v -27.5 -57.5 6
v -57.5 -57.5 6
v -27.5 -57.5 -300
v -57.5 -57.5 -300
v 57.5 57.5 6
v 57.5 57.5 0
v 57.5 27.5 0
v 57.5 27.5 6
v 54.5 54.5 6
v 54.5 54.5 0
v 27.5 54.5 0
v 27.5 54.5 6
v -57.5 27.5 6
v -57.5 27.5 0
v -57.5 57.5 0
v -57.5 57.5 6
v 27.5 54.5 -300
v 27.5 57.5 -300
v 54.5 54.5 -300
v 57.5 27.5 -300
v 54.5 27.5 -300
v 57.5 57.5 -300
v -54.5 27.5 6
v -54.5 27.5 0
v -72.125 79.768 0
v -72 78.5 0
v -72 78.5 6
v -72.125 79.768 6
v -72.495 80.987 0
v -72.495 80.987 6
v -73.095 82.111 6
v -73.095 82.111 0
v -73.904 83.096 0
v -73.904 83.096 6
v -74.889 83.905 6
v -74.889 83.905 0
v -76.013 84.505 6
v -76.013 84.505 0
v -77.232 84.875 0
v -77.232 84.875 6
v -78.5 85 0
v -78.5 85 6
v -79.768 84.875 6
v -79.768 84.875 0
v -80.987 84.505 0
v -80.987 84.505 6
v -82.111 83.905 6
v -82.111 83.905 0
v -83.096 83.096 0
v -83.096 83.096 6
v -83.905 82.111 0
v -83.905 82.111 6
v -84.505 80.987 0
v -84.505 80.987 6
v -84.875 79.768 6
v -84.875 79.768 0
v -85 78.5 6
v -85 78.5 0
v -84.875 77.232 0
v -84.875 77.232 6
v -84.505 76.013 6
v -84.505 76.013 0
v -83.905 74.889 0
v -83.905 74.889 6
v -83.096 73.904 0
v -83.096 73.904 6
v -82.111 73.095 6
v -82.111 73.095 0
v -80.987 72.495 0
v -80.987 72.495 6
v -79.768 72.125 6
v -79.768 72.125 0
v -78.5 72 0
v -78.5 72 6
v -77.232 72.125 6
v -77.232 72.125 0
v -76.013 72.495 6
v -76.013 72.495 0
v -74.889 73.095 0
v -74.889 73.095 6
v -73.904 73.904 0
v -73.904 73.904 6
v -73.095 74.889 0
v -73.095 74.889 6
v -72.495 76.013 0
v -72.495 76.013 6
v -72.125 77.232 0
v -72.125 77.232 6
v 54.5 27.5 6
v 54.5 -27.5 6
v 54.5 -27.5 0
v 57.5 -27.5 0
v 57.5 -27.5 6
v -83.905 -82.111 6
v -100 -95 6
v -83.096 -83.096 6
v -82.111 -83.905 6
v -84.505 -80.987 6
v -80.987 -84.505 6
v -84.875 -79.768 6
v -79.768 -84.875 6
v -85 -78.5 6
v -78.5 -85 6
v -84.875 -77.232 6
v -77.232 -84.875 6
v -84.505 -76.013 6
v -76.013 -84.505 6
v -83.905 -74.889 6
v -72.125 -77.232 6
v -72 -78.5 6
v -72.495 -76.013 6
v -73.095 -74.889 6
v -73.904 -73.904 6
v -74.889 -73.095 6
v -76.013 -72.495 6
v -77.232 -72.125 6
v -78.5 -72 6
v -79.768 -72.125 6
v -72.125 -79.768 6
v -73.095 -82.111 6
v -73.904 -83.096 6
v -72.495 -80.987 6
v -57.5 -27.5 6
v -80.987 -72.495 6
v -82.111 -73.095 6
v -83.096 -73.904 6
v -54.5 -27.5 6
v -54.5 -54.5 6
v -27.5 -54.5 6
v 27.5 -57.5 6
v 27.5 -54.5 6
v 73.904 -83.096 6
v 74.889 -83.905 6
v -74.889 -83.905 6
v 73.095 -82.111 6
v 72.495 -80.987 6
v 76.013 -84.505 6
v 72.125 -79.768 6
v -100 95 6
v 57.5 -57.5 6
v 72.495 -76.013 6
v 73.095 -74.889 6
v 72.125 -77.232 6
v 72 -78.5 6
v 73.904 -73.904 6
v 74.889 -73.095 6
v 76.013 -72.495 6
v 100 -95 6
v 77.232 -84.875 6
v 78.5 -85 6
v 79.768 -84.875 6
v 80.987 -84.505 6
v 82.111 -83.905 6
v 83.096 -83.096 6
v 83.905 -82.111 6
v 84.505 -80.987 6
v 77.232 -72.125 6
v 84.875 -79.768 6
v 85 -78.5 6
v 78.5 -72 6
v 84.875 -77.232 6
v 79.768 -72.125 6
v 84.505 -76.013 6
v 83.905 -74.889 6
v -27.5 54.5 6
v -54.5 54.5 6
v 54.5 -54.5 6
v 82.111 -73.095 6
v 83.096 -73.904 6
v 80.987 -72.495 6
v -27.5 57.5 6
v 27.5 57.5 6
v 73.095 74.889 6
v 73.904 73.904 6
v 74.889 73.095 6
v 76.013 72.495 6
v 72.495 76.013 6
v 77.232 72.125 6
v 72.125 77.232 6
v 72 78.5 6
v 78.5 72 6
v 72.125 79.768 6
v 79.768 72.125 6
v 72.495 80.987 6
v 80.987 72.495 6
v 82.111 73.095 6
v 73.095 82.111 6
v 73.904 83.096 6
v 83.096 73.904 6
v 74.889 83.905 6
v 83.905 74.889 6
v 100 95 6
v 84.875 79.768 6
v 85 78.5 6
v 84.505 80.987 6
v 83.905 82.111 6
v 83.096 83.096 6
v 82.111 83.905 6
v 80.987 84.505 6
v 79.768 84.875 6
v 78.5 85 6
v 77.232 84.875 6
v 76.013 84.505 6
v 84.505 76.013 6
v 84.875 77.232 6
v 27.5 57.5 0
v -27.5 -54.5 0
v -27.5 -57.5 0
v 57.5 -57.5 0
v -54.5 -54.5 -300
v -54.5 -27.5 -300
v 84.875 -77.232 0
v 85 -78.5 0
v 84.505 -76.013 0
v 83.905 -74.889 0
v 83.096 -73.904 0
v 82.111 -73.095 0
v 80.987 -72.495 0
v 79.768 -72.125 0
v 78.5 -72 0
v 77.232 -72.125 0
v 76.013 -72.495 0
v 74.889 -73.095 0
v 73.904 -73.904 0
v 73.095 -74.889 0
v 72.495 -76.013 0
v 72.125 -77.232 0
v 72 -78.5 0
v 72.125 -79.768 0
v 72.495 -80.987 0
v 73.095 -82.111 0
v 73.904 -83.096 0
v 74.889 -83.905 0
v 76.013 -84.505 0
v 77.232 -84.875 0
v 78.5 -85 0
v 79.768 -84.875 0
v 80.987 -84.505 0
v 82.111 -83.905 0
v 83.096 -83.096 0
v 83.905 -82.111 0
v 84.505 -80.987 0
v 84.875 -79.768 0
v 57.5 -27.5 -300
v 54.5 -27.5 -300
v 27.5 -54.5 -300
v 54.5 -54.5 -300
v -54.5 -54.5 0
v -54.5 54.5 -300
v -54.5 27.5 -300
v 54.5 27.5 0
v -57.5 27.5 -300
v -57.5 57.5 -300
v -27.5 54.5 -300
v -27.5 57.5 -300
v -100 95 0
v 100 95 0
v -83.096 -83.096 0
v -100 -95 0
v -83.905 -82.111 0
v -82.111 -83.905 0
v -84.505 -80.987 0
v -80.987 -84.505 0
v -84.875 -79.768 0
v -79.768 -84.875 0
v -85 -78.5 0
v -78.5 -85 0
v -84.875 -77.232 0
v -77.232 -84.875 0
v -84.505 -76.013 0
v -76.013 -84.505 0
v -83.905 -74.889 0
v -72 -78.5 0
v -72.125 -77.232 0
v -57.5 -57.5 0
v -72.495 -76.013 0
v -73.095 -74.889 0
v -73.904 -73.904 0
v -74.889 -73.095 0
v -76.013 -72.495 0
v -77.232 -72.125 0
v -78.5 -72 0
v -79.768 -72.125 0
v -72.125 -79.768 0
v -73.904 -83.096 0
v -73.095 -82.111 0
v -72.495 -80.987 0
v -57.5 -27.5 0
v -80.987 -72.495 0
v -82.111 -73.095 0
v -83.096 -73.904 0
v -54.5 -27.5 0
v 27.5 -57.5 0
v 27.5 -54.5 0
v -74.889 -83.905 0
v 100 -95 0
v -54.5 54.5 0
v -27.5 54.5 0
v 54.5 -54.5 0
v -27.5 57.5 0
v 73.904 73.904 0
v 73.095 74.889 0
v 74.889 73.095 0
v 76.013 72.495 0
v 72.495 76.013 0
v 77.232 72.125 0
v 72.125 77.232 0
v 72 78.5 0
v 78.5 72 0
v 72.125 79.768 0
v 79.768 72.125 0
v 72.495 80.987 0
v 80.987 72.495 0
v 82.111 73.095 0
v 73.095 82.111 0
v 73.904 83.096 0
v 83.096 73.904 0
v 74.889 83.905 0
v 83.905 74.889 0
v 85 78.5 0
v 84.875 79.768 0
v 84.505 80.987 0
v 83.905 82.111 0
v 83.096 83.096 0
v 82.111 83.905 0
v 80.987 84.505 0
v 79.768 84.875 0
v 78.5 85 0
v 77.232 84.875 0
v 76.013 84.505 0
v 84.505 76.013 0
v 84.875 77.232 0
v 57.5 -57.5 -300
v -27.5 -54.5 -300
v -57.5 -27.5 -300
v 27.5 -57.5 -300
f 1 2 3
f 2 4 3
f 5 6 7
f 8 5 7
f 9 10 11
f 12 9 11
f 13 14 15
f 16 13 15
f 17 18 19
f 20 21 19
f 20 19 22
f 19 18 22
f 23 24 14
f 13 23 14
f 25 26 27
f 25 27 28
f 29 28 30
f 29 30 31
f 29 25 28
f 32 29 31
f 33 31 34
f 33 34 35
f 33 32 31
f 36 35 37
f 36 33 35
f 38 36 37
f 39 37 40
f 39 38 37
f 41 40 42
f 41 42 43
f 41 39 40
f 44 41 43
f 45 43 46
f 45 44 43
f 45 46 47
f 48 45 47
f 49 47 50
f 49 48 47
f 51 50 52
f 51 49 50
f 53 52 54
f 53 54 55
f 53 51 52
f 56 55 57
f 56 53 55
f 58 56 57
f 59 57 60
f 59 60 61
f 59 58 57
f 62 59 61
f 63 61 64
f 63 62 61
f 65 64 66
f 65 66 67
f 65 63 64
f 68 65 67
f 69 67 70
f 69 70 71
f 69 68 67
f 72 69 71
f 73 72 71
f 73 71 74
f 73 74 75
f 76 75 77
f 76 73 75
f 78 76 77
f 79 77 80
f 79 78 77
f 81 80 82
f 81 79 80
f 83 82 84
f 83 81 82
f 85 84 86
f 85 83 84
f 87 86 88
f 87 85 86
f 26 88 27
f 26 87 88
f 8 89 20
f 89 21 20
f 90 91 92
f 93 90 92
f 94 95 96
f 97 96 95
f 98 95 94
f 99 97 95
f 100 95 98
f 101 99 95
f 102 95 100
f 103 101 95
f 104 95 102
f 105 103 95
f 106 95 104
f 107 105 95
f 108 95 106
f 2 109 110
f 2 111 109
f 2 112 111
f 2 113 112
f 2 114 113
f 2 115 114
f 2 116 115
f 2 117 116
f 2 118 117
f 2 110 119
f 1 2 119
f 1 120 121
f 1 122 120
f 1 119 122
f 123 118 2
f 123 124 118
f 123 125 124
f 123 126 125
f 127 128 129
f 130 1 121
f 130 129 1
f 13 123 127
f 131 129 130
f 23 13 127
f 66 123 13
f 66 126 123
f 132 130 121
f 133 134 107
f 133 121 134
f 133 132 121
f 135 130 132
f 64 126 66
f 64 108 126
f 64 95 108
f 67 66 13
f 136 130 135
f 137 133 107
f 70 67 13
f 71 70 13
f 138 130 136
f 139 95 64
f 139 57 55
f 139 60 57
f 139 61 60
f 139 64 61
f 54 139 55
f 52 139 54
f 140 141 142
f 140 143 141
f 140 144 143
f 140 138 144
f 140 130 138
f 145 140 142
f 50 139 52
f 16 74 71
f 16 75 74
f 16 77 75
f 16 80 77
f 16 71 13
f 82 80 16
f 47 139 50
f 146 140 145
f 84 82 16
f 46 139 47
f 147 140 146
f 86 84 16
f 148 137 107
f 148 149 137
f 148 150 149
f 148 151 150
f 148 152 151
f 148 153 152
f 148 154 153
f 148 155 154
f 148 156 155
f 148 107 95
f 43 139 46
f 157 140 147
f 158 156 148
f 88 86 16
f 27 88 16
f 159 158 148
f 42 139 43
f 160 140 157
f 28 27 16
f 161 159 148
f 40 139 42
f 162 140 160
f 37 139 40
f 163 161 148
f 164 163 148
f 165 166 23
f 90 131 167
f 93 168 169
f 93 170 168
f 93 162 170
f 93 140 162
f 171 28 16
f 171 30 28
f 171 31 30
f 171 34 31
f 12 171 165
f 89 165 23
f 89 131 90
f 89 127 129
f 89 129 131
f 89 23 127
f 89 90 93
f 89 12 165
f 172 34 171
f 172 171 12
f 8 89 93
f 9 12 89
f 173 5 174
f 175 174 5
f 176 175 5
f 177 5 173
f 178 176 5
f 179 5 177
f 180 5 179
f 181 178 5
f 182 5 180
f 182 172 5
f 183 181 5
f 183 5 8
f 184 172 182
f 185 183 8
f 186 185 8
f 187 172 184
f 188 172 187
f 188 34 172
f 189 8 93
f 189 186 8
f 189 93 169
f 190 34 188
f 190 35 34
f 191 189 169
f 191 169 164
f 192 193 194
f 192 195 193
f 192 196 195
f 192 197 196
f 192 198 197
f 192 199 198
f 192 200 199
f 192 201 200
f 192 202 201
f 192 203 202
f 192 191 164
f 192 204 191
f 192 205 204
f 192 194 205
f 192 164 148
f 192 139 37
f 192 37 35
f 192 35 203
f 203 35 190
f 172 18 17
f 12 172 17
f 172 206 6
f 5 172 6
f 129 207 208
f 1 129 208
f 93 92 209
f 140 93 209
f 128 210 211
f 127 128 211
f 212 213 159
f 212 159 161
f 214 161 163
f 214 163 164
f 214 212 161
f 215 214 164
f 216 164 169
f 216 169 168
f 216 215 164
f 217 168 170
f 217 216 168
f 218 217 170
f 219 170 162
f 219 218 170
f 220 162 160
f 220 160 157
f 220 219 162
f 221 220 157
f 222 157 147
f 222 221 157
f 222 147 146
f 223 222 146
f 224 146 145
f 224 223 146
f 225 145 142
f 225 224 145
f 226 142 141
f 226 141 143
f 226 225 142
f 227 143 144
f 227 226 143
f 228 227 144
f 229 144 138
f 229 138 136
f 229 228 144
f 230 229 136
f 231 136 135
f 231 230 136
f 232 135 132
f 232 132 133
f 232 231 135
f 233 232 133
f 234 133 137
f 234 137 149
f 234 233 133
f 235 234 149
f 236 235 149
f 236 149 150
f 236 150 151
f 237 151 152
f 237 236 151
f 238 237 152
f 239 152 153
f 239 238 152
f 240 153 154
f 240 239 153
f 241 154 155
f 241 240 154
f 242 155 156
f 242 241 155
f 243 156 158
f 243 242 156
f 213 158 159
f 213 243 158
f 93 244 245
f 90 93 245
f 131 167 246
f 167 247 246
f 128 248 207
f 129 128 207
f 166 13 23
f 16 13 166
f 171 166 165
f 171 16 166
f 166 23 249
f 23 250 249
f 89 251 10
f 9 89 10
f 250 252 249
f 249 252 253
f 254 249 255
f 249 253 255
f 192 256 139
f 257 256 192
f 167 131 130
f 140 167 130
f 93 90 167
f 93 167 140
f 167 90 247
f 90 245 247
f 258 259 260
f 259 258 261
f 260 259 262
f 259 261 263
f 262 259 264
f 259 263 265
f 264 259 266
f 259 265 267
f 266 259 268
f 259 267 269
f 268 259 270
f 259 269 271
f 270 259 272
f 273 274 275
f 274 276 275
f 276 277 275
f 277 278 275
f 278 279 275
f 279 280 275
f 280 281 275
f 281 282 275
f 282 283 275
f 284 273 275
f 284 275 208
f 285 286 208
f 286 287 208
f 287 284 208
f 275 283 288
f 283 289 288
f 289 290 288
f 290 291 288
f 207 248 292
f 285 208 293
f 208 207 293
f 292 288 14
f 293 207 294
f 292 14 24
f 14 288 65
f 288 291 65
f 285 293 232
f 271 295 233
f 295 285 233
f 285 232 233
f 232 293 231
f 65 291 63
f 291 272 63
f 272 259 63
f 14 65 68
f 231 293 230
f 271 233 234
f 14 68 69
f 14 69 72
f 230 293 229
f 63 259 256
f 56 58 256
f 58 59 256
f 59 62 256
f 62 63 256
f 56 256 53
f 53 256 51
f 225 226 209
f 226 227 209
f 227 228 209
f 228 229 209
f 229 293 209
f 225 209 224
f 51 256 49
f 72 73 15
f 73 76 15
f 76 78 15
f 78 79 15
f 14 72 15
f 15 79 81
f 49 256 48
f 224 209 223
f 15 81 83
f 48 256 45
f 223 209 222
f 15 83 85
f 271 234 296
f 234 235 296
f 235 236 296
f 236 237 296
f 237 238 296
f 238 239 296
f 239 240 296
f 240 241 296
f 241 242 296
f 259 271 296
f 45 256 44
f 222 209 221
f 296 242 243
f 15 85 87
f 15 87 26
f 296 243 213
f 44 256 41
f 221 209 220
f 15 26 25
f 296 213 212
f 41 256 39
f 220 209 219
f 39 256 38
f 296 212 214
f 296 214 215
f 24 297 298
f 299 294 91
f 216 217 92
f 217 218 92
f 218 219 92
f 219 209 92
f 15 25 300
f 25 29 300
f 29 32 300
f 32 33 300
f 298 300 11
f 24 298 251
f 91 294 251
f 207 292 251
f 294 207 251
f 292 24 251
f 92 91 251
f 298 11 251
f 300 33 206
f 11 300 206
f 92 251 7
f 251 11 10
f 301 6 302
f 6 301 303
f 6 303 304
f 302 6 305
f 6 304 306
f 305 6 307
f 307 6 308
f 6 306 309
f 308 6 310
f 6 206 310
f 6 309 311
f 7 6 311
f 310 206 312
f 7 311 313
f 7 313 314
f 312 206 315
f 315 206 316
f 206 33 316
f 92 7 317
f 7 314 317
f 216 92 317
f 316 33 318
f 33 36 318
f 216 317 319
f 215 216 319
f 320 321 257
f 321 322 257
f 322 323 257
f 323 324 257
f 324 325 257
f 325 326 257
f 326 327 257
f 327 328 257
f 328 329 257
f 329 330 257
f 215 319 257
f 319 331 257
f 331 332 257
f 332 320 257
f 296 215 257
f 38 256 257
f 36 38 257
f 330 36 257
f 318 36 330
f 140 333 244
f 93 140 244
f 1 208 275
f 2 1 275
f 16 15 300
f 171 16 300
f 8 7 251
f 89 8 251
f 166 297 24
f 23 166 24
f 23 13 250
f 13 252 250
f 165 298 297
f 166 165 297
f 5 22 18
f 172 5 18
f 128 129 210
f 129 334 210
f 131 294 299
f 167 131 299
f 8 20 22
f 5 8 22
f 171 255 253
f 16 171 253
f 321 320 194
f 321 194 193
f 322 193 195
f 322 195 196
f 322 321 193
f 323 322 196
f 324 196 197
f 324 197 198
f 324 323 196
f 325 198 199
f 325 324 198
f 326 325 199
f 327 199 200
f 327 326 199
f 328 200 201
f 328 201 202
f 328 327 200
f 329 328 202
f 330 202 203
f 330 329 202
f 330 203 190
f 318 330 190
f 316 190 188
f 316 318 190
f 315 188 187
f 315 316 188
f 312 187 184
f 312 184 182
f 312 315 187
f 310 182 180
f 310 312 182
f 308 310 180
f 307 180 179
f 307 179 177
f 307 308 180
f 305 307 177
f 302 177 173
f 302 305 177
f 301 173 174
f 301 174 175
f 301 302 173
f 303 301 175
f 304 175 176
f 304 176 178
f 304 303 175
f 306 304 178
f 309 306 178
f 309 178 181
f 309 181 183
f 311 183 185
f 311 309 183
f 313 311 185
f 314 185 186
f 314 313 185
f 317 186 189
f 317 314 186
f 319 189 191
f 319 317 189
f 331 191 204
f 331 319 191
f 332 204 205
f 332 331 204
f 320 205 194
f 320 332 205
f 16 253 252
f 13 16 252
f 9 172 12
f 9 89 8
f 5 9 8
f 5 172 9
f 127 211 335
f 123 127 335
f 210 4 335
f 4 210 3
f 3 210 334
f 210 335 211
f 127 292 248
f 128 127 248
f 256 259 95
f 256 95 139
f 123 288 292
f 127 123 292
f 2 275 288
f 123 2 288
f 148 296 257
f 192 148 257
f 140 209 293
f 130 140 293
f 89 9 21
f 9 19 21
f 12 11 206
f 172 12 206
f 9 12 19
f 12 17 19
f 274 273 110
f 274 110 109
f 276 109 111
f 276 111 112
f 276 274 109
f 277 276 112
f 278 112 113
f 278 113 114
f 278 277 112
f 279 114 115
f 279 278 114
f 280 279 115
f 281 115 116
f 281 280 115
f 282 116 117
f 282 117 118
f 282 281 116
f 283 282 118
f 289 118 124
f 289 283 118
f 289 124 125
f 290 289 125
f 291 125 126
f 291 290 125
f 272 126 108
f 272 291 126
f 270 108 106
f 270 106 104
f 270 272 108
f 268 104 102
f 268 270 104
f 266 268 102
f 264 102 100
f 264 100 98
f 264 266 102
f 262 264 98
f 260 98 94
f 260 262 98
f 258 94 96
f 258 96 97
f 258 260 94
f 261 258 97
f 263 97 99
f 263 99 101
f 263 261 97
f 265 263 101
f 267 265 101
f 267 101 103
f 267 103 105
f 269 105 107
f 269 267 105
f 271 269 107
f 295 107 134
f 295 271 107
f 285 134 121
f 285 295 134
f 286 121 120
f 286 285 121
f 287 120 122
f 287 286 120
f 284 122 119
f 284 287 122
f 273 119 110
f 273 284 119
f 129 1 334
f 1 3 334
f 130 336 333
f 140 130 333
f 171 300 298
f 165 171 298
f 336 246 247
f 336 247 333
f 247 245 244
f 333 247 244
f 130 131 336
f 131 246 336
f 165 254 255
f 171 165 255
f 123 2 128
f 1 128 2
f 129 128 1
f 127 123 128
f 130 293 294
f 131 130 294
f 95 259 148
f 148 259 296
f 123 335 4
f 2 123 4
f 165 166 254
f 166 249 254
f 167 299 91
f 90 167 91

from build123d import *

# Parameters (mm, degrees)
F0_W          = 200
F0_H          = 190
F0_R          = 6.5
F2_DEPTH      = 6
F3_DEPTH      = 300
F3_DEPTH_BACK = 6


with BuildPart() as f2:
    # F0 (on Top) → F2 (new body)
    with BuildSketch(Plane.XY):
        Rectangle(F0_W, F0_H)
        with Locations((-78.5, -78.5)):
            Circle(F0_R, mode=Mode.SUBTRACT)
        Polygon((-57.5, -57.5), (-57.5, -27.5), (-54.5, -27.5), (-54.5, -54.5), (-27.5, -54.5), (-27.5, -57.5), align=None, mode=Mode.SUBTRACT)
        with Locations((78.5, -78.5)):
            Circle(F0_R, mode=Mode.SUBTRACT)
        Polygon((54.5, -27.5), (57.5, -27.5), (57.5, -57.5), (27.5, -57.5), (27.5, -54.5), (54.5, -54.5), align=None, mode=Mode.SUBTRACT)
        Polygon((-57.5, 27.5), (-57.5, 57.5), (-27.5, 57.5), (-27.5, 54.5), (-54.5, 54.5), (-54.5, 27.5), align=None, mode=Mode.SUBTRACT)
        with Locations((-78.5, 78.5)):
            Circle(F0_R, mode=Mode.SUBTRACT)
        Polygon((27.5, 54.5), (27.5, 57.5), (57.5, 57.5), (57.5, 27.5), (54.5, 27.5), (54.5, 54.5), align=None, mode=Mode.SUBTRACT)
        with Locations((78.5, 78.5)):
            Circle(F0_R, mode=Mode.SUBTRACT)
    extrude(amount=F2_DEPTH)


with BuildPart() as f3:
    # F1 (on face) → F3 (new body, two sides)
    with BuildSketch(Plane.XY) as f3_sk:
        Polygon((-57.5, -27.5), (-57.5, -57.5), (-27.5, -57.5), (-27.5, -54.5), (-54.5, -54.5), (-54.5, -27.5), align=None)
    extrude(amount=-F3_DEPTH)
    extrude(f3_sk.sketch, amount=F3_DEPTH_BACK)


with BuildPart() as f3b:
    # F1 (on face) → F3, piece 2 (new body, two sides)
    with BuildSketch(Plane.XY) as f3_2_sk:
        Polygon((-57.5, 57.5), (-57.5, 27.5), (-54.5, 27.5), (-54.5, 54.5), (-27.5, 54.5), (-27.5, 57.5), align=None)
    extrude(amount=-F3_DEPTH)
    extrude(f3_2_sk.sketch, amount=F3_DEPTH_BACK)


with BuildPart() as f3c:
    # F1 (on face) → F3, piece 3 (new body, two sides)
    with BuildSketch(Plane.XY) as f3_3_sk:
        Polygon((27.5, 57.5), (27.5, 54.5), (54.5, 54.5), (54.5, 27.5), (57.5, 27.5), (57.5, 57.5), align=None)
    extrude(amount=-F3_DEPTH)
    extrude(f3_3_sk.sketch, amount=F3_DEPTH_BACK)


with BuildPart() as f3d:
    # F1 (on face) → F3, piece 4 (new body, two sides)
    with BuildSketch(Plane.XY) as f3_4_sk:
        Polygon((57.5, -27.5), (54.5, -27.5), (54.5, -54.5), (27.5, -54.5), (27.5, -57.5), (57.5, -57.5), align=None)
    extrude(amount=-F3_DEPTH)
    extrude(f3_4_sk.sketch, amount=F3_DEPTH_BACK)


solid = Compound([f2.part, f3.part, f3b.part, f3c.part, f3d.part])
